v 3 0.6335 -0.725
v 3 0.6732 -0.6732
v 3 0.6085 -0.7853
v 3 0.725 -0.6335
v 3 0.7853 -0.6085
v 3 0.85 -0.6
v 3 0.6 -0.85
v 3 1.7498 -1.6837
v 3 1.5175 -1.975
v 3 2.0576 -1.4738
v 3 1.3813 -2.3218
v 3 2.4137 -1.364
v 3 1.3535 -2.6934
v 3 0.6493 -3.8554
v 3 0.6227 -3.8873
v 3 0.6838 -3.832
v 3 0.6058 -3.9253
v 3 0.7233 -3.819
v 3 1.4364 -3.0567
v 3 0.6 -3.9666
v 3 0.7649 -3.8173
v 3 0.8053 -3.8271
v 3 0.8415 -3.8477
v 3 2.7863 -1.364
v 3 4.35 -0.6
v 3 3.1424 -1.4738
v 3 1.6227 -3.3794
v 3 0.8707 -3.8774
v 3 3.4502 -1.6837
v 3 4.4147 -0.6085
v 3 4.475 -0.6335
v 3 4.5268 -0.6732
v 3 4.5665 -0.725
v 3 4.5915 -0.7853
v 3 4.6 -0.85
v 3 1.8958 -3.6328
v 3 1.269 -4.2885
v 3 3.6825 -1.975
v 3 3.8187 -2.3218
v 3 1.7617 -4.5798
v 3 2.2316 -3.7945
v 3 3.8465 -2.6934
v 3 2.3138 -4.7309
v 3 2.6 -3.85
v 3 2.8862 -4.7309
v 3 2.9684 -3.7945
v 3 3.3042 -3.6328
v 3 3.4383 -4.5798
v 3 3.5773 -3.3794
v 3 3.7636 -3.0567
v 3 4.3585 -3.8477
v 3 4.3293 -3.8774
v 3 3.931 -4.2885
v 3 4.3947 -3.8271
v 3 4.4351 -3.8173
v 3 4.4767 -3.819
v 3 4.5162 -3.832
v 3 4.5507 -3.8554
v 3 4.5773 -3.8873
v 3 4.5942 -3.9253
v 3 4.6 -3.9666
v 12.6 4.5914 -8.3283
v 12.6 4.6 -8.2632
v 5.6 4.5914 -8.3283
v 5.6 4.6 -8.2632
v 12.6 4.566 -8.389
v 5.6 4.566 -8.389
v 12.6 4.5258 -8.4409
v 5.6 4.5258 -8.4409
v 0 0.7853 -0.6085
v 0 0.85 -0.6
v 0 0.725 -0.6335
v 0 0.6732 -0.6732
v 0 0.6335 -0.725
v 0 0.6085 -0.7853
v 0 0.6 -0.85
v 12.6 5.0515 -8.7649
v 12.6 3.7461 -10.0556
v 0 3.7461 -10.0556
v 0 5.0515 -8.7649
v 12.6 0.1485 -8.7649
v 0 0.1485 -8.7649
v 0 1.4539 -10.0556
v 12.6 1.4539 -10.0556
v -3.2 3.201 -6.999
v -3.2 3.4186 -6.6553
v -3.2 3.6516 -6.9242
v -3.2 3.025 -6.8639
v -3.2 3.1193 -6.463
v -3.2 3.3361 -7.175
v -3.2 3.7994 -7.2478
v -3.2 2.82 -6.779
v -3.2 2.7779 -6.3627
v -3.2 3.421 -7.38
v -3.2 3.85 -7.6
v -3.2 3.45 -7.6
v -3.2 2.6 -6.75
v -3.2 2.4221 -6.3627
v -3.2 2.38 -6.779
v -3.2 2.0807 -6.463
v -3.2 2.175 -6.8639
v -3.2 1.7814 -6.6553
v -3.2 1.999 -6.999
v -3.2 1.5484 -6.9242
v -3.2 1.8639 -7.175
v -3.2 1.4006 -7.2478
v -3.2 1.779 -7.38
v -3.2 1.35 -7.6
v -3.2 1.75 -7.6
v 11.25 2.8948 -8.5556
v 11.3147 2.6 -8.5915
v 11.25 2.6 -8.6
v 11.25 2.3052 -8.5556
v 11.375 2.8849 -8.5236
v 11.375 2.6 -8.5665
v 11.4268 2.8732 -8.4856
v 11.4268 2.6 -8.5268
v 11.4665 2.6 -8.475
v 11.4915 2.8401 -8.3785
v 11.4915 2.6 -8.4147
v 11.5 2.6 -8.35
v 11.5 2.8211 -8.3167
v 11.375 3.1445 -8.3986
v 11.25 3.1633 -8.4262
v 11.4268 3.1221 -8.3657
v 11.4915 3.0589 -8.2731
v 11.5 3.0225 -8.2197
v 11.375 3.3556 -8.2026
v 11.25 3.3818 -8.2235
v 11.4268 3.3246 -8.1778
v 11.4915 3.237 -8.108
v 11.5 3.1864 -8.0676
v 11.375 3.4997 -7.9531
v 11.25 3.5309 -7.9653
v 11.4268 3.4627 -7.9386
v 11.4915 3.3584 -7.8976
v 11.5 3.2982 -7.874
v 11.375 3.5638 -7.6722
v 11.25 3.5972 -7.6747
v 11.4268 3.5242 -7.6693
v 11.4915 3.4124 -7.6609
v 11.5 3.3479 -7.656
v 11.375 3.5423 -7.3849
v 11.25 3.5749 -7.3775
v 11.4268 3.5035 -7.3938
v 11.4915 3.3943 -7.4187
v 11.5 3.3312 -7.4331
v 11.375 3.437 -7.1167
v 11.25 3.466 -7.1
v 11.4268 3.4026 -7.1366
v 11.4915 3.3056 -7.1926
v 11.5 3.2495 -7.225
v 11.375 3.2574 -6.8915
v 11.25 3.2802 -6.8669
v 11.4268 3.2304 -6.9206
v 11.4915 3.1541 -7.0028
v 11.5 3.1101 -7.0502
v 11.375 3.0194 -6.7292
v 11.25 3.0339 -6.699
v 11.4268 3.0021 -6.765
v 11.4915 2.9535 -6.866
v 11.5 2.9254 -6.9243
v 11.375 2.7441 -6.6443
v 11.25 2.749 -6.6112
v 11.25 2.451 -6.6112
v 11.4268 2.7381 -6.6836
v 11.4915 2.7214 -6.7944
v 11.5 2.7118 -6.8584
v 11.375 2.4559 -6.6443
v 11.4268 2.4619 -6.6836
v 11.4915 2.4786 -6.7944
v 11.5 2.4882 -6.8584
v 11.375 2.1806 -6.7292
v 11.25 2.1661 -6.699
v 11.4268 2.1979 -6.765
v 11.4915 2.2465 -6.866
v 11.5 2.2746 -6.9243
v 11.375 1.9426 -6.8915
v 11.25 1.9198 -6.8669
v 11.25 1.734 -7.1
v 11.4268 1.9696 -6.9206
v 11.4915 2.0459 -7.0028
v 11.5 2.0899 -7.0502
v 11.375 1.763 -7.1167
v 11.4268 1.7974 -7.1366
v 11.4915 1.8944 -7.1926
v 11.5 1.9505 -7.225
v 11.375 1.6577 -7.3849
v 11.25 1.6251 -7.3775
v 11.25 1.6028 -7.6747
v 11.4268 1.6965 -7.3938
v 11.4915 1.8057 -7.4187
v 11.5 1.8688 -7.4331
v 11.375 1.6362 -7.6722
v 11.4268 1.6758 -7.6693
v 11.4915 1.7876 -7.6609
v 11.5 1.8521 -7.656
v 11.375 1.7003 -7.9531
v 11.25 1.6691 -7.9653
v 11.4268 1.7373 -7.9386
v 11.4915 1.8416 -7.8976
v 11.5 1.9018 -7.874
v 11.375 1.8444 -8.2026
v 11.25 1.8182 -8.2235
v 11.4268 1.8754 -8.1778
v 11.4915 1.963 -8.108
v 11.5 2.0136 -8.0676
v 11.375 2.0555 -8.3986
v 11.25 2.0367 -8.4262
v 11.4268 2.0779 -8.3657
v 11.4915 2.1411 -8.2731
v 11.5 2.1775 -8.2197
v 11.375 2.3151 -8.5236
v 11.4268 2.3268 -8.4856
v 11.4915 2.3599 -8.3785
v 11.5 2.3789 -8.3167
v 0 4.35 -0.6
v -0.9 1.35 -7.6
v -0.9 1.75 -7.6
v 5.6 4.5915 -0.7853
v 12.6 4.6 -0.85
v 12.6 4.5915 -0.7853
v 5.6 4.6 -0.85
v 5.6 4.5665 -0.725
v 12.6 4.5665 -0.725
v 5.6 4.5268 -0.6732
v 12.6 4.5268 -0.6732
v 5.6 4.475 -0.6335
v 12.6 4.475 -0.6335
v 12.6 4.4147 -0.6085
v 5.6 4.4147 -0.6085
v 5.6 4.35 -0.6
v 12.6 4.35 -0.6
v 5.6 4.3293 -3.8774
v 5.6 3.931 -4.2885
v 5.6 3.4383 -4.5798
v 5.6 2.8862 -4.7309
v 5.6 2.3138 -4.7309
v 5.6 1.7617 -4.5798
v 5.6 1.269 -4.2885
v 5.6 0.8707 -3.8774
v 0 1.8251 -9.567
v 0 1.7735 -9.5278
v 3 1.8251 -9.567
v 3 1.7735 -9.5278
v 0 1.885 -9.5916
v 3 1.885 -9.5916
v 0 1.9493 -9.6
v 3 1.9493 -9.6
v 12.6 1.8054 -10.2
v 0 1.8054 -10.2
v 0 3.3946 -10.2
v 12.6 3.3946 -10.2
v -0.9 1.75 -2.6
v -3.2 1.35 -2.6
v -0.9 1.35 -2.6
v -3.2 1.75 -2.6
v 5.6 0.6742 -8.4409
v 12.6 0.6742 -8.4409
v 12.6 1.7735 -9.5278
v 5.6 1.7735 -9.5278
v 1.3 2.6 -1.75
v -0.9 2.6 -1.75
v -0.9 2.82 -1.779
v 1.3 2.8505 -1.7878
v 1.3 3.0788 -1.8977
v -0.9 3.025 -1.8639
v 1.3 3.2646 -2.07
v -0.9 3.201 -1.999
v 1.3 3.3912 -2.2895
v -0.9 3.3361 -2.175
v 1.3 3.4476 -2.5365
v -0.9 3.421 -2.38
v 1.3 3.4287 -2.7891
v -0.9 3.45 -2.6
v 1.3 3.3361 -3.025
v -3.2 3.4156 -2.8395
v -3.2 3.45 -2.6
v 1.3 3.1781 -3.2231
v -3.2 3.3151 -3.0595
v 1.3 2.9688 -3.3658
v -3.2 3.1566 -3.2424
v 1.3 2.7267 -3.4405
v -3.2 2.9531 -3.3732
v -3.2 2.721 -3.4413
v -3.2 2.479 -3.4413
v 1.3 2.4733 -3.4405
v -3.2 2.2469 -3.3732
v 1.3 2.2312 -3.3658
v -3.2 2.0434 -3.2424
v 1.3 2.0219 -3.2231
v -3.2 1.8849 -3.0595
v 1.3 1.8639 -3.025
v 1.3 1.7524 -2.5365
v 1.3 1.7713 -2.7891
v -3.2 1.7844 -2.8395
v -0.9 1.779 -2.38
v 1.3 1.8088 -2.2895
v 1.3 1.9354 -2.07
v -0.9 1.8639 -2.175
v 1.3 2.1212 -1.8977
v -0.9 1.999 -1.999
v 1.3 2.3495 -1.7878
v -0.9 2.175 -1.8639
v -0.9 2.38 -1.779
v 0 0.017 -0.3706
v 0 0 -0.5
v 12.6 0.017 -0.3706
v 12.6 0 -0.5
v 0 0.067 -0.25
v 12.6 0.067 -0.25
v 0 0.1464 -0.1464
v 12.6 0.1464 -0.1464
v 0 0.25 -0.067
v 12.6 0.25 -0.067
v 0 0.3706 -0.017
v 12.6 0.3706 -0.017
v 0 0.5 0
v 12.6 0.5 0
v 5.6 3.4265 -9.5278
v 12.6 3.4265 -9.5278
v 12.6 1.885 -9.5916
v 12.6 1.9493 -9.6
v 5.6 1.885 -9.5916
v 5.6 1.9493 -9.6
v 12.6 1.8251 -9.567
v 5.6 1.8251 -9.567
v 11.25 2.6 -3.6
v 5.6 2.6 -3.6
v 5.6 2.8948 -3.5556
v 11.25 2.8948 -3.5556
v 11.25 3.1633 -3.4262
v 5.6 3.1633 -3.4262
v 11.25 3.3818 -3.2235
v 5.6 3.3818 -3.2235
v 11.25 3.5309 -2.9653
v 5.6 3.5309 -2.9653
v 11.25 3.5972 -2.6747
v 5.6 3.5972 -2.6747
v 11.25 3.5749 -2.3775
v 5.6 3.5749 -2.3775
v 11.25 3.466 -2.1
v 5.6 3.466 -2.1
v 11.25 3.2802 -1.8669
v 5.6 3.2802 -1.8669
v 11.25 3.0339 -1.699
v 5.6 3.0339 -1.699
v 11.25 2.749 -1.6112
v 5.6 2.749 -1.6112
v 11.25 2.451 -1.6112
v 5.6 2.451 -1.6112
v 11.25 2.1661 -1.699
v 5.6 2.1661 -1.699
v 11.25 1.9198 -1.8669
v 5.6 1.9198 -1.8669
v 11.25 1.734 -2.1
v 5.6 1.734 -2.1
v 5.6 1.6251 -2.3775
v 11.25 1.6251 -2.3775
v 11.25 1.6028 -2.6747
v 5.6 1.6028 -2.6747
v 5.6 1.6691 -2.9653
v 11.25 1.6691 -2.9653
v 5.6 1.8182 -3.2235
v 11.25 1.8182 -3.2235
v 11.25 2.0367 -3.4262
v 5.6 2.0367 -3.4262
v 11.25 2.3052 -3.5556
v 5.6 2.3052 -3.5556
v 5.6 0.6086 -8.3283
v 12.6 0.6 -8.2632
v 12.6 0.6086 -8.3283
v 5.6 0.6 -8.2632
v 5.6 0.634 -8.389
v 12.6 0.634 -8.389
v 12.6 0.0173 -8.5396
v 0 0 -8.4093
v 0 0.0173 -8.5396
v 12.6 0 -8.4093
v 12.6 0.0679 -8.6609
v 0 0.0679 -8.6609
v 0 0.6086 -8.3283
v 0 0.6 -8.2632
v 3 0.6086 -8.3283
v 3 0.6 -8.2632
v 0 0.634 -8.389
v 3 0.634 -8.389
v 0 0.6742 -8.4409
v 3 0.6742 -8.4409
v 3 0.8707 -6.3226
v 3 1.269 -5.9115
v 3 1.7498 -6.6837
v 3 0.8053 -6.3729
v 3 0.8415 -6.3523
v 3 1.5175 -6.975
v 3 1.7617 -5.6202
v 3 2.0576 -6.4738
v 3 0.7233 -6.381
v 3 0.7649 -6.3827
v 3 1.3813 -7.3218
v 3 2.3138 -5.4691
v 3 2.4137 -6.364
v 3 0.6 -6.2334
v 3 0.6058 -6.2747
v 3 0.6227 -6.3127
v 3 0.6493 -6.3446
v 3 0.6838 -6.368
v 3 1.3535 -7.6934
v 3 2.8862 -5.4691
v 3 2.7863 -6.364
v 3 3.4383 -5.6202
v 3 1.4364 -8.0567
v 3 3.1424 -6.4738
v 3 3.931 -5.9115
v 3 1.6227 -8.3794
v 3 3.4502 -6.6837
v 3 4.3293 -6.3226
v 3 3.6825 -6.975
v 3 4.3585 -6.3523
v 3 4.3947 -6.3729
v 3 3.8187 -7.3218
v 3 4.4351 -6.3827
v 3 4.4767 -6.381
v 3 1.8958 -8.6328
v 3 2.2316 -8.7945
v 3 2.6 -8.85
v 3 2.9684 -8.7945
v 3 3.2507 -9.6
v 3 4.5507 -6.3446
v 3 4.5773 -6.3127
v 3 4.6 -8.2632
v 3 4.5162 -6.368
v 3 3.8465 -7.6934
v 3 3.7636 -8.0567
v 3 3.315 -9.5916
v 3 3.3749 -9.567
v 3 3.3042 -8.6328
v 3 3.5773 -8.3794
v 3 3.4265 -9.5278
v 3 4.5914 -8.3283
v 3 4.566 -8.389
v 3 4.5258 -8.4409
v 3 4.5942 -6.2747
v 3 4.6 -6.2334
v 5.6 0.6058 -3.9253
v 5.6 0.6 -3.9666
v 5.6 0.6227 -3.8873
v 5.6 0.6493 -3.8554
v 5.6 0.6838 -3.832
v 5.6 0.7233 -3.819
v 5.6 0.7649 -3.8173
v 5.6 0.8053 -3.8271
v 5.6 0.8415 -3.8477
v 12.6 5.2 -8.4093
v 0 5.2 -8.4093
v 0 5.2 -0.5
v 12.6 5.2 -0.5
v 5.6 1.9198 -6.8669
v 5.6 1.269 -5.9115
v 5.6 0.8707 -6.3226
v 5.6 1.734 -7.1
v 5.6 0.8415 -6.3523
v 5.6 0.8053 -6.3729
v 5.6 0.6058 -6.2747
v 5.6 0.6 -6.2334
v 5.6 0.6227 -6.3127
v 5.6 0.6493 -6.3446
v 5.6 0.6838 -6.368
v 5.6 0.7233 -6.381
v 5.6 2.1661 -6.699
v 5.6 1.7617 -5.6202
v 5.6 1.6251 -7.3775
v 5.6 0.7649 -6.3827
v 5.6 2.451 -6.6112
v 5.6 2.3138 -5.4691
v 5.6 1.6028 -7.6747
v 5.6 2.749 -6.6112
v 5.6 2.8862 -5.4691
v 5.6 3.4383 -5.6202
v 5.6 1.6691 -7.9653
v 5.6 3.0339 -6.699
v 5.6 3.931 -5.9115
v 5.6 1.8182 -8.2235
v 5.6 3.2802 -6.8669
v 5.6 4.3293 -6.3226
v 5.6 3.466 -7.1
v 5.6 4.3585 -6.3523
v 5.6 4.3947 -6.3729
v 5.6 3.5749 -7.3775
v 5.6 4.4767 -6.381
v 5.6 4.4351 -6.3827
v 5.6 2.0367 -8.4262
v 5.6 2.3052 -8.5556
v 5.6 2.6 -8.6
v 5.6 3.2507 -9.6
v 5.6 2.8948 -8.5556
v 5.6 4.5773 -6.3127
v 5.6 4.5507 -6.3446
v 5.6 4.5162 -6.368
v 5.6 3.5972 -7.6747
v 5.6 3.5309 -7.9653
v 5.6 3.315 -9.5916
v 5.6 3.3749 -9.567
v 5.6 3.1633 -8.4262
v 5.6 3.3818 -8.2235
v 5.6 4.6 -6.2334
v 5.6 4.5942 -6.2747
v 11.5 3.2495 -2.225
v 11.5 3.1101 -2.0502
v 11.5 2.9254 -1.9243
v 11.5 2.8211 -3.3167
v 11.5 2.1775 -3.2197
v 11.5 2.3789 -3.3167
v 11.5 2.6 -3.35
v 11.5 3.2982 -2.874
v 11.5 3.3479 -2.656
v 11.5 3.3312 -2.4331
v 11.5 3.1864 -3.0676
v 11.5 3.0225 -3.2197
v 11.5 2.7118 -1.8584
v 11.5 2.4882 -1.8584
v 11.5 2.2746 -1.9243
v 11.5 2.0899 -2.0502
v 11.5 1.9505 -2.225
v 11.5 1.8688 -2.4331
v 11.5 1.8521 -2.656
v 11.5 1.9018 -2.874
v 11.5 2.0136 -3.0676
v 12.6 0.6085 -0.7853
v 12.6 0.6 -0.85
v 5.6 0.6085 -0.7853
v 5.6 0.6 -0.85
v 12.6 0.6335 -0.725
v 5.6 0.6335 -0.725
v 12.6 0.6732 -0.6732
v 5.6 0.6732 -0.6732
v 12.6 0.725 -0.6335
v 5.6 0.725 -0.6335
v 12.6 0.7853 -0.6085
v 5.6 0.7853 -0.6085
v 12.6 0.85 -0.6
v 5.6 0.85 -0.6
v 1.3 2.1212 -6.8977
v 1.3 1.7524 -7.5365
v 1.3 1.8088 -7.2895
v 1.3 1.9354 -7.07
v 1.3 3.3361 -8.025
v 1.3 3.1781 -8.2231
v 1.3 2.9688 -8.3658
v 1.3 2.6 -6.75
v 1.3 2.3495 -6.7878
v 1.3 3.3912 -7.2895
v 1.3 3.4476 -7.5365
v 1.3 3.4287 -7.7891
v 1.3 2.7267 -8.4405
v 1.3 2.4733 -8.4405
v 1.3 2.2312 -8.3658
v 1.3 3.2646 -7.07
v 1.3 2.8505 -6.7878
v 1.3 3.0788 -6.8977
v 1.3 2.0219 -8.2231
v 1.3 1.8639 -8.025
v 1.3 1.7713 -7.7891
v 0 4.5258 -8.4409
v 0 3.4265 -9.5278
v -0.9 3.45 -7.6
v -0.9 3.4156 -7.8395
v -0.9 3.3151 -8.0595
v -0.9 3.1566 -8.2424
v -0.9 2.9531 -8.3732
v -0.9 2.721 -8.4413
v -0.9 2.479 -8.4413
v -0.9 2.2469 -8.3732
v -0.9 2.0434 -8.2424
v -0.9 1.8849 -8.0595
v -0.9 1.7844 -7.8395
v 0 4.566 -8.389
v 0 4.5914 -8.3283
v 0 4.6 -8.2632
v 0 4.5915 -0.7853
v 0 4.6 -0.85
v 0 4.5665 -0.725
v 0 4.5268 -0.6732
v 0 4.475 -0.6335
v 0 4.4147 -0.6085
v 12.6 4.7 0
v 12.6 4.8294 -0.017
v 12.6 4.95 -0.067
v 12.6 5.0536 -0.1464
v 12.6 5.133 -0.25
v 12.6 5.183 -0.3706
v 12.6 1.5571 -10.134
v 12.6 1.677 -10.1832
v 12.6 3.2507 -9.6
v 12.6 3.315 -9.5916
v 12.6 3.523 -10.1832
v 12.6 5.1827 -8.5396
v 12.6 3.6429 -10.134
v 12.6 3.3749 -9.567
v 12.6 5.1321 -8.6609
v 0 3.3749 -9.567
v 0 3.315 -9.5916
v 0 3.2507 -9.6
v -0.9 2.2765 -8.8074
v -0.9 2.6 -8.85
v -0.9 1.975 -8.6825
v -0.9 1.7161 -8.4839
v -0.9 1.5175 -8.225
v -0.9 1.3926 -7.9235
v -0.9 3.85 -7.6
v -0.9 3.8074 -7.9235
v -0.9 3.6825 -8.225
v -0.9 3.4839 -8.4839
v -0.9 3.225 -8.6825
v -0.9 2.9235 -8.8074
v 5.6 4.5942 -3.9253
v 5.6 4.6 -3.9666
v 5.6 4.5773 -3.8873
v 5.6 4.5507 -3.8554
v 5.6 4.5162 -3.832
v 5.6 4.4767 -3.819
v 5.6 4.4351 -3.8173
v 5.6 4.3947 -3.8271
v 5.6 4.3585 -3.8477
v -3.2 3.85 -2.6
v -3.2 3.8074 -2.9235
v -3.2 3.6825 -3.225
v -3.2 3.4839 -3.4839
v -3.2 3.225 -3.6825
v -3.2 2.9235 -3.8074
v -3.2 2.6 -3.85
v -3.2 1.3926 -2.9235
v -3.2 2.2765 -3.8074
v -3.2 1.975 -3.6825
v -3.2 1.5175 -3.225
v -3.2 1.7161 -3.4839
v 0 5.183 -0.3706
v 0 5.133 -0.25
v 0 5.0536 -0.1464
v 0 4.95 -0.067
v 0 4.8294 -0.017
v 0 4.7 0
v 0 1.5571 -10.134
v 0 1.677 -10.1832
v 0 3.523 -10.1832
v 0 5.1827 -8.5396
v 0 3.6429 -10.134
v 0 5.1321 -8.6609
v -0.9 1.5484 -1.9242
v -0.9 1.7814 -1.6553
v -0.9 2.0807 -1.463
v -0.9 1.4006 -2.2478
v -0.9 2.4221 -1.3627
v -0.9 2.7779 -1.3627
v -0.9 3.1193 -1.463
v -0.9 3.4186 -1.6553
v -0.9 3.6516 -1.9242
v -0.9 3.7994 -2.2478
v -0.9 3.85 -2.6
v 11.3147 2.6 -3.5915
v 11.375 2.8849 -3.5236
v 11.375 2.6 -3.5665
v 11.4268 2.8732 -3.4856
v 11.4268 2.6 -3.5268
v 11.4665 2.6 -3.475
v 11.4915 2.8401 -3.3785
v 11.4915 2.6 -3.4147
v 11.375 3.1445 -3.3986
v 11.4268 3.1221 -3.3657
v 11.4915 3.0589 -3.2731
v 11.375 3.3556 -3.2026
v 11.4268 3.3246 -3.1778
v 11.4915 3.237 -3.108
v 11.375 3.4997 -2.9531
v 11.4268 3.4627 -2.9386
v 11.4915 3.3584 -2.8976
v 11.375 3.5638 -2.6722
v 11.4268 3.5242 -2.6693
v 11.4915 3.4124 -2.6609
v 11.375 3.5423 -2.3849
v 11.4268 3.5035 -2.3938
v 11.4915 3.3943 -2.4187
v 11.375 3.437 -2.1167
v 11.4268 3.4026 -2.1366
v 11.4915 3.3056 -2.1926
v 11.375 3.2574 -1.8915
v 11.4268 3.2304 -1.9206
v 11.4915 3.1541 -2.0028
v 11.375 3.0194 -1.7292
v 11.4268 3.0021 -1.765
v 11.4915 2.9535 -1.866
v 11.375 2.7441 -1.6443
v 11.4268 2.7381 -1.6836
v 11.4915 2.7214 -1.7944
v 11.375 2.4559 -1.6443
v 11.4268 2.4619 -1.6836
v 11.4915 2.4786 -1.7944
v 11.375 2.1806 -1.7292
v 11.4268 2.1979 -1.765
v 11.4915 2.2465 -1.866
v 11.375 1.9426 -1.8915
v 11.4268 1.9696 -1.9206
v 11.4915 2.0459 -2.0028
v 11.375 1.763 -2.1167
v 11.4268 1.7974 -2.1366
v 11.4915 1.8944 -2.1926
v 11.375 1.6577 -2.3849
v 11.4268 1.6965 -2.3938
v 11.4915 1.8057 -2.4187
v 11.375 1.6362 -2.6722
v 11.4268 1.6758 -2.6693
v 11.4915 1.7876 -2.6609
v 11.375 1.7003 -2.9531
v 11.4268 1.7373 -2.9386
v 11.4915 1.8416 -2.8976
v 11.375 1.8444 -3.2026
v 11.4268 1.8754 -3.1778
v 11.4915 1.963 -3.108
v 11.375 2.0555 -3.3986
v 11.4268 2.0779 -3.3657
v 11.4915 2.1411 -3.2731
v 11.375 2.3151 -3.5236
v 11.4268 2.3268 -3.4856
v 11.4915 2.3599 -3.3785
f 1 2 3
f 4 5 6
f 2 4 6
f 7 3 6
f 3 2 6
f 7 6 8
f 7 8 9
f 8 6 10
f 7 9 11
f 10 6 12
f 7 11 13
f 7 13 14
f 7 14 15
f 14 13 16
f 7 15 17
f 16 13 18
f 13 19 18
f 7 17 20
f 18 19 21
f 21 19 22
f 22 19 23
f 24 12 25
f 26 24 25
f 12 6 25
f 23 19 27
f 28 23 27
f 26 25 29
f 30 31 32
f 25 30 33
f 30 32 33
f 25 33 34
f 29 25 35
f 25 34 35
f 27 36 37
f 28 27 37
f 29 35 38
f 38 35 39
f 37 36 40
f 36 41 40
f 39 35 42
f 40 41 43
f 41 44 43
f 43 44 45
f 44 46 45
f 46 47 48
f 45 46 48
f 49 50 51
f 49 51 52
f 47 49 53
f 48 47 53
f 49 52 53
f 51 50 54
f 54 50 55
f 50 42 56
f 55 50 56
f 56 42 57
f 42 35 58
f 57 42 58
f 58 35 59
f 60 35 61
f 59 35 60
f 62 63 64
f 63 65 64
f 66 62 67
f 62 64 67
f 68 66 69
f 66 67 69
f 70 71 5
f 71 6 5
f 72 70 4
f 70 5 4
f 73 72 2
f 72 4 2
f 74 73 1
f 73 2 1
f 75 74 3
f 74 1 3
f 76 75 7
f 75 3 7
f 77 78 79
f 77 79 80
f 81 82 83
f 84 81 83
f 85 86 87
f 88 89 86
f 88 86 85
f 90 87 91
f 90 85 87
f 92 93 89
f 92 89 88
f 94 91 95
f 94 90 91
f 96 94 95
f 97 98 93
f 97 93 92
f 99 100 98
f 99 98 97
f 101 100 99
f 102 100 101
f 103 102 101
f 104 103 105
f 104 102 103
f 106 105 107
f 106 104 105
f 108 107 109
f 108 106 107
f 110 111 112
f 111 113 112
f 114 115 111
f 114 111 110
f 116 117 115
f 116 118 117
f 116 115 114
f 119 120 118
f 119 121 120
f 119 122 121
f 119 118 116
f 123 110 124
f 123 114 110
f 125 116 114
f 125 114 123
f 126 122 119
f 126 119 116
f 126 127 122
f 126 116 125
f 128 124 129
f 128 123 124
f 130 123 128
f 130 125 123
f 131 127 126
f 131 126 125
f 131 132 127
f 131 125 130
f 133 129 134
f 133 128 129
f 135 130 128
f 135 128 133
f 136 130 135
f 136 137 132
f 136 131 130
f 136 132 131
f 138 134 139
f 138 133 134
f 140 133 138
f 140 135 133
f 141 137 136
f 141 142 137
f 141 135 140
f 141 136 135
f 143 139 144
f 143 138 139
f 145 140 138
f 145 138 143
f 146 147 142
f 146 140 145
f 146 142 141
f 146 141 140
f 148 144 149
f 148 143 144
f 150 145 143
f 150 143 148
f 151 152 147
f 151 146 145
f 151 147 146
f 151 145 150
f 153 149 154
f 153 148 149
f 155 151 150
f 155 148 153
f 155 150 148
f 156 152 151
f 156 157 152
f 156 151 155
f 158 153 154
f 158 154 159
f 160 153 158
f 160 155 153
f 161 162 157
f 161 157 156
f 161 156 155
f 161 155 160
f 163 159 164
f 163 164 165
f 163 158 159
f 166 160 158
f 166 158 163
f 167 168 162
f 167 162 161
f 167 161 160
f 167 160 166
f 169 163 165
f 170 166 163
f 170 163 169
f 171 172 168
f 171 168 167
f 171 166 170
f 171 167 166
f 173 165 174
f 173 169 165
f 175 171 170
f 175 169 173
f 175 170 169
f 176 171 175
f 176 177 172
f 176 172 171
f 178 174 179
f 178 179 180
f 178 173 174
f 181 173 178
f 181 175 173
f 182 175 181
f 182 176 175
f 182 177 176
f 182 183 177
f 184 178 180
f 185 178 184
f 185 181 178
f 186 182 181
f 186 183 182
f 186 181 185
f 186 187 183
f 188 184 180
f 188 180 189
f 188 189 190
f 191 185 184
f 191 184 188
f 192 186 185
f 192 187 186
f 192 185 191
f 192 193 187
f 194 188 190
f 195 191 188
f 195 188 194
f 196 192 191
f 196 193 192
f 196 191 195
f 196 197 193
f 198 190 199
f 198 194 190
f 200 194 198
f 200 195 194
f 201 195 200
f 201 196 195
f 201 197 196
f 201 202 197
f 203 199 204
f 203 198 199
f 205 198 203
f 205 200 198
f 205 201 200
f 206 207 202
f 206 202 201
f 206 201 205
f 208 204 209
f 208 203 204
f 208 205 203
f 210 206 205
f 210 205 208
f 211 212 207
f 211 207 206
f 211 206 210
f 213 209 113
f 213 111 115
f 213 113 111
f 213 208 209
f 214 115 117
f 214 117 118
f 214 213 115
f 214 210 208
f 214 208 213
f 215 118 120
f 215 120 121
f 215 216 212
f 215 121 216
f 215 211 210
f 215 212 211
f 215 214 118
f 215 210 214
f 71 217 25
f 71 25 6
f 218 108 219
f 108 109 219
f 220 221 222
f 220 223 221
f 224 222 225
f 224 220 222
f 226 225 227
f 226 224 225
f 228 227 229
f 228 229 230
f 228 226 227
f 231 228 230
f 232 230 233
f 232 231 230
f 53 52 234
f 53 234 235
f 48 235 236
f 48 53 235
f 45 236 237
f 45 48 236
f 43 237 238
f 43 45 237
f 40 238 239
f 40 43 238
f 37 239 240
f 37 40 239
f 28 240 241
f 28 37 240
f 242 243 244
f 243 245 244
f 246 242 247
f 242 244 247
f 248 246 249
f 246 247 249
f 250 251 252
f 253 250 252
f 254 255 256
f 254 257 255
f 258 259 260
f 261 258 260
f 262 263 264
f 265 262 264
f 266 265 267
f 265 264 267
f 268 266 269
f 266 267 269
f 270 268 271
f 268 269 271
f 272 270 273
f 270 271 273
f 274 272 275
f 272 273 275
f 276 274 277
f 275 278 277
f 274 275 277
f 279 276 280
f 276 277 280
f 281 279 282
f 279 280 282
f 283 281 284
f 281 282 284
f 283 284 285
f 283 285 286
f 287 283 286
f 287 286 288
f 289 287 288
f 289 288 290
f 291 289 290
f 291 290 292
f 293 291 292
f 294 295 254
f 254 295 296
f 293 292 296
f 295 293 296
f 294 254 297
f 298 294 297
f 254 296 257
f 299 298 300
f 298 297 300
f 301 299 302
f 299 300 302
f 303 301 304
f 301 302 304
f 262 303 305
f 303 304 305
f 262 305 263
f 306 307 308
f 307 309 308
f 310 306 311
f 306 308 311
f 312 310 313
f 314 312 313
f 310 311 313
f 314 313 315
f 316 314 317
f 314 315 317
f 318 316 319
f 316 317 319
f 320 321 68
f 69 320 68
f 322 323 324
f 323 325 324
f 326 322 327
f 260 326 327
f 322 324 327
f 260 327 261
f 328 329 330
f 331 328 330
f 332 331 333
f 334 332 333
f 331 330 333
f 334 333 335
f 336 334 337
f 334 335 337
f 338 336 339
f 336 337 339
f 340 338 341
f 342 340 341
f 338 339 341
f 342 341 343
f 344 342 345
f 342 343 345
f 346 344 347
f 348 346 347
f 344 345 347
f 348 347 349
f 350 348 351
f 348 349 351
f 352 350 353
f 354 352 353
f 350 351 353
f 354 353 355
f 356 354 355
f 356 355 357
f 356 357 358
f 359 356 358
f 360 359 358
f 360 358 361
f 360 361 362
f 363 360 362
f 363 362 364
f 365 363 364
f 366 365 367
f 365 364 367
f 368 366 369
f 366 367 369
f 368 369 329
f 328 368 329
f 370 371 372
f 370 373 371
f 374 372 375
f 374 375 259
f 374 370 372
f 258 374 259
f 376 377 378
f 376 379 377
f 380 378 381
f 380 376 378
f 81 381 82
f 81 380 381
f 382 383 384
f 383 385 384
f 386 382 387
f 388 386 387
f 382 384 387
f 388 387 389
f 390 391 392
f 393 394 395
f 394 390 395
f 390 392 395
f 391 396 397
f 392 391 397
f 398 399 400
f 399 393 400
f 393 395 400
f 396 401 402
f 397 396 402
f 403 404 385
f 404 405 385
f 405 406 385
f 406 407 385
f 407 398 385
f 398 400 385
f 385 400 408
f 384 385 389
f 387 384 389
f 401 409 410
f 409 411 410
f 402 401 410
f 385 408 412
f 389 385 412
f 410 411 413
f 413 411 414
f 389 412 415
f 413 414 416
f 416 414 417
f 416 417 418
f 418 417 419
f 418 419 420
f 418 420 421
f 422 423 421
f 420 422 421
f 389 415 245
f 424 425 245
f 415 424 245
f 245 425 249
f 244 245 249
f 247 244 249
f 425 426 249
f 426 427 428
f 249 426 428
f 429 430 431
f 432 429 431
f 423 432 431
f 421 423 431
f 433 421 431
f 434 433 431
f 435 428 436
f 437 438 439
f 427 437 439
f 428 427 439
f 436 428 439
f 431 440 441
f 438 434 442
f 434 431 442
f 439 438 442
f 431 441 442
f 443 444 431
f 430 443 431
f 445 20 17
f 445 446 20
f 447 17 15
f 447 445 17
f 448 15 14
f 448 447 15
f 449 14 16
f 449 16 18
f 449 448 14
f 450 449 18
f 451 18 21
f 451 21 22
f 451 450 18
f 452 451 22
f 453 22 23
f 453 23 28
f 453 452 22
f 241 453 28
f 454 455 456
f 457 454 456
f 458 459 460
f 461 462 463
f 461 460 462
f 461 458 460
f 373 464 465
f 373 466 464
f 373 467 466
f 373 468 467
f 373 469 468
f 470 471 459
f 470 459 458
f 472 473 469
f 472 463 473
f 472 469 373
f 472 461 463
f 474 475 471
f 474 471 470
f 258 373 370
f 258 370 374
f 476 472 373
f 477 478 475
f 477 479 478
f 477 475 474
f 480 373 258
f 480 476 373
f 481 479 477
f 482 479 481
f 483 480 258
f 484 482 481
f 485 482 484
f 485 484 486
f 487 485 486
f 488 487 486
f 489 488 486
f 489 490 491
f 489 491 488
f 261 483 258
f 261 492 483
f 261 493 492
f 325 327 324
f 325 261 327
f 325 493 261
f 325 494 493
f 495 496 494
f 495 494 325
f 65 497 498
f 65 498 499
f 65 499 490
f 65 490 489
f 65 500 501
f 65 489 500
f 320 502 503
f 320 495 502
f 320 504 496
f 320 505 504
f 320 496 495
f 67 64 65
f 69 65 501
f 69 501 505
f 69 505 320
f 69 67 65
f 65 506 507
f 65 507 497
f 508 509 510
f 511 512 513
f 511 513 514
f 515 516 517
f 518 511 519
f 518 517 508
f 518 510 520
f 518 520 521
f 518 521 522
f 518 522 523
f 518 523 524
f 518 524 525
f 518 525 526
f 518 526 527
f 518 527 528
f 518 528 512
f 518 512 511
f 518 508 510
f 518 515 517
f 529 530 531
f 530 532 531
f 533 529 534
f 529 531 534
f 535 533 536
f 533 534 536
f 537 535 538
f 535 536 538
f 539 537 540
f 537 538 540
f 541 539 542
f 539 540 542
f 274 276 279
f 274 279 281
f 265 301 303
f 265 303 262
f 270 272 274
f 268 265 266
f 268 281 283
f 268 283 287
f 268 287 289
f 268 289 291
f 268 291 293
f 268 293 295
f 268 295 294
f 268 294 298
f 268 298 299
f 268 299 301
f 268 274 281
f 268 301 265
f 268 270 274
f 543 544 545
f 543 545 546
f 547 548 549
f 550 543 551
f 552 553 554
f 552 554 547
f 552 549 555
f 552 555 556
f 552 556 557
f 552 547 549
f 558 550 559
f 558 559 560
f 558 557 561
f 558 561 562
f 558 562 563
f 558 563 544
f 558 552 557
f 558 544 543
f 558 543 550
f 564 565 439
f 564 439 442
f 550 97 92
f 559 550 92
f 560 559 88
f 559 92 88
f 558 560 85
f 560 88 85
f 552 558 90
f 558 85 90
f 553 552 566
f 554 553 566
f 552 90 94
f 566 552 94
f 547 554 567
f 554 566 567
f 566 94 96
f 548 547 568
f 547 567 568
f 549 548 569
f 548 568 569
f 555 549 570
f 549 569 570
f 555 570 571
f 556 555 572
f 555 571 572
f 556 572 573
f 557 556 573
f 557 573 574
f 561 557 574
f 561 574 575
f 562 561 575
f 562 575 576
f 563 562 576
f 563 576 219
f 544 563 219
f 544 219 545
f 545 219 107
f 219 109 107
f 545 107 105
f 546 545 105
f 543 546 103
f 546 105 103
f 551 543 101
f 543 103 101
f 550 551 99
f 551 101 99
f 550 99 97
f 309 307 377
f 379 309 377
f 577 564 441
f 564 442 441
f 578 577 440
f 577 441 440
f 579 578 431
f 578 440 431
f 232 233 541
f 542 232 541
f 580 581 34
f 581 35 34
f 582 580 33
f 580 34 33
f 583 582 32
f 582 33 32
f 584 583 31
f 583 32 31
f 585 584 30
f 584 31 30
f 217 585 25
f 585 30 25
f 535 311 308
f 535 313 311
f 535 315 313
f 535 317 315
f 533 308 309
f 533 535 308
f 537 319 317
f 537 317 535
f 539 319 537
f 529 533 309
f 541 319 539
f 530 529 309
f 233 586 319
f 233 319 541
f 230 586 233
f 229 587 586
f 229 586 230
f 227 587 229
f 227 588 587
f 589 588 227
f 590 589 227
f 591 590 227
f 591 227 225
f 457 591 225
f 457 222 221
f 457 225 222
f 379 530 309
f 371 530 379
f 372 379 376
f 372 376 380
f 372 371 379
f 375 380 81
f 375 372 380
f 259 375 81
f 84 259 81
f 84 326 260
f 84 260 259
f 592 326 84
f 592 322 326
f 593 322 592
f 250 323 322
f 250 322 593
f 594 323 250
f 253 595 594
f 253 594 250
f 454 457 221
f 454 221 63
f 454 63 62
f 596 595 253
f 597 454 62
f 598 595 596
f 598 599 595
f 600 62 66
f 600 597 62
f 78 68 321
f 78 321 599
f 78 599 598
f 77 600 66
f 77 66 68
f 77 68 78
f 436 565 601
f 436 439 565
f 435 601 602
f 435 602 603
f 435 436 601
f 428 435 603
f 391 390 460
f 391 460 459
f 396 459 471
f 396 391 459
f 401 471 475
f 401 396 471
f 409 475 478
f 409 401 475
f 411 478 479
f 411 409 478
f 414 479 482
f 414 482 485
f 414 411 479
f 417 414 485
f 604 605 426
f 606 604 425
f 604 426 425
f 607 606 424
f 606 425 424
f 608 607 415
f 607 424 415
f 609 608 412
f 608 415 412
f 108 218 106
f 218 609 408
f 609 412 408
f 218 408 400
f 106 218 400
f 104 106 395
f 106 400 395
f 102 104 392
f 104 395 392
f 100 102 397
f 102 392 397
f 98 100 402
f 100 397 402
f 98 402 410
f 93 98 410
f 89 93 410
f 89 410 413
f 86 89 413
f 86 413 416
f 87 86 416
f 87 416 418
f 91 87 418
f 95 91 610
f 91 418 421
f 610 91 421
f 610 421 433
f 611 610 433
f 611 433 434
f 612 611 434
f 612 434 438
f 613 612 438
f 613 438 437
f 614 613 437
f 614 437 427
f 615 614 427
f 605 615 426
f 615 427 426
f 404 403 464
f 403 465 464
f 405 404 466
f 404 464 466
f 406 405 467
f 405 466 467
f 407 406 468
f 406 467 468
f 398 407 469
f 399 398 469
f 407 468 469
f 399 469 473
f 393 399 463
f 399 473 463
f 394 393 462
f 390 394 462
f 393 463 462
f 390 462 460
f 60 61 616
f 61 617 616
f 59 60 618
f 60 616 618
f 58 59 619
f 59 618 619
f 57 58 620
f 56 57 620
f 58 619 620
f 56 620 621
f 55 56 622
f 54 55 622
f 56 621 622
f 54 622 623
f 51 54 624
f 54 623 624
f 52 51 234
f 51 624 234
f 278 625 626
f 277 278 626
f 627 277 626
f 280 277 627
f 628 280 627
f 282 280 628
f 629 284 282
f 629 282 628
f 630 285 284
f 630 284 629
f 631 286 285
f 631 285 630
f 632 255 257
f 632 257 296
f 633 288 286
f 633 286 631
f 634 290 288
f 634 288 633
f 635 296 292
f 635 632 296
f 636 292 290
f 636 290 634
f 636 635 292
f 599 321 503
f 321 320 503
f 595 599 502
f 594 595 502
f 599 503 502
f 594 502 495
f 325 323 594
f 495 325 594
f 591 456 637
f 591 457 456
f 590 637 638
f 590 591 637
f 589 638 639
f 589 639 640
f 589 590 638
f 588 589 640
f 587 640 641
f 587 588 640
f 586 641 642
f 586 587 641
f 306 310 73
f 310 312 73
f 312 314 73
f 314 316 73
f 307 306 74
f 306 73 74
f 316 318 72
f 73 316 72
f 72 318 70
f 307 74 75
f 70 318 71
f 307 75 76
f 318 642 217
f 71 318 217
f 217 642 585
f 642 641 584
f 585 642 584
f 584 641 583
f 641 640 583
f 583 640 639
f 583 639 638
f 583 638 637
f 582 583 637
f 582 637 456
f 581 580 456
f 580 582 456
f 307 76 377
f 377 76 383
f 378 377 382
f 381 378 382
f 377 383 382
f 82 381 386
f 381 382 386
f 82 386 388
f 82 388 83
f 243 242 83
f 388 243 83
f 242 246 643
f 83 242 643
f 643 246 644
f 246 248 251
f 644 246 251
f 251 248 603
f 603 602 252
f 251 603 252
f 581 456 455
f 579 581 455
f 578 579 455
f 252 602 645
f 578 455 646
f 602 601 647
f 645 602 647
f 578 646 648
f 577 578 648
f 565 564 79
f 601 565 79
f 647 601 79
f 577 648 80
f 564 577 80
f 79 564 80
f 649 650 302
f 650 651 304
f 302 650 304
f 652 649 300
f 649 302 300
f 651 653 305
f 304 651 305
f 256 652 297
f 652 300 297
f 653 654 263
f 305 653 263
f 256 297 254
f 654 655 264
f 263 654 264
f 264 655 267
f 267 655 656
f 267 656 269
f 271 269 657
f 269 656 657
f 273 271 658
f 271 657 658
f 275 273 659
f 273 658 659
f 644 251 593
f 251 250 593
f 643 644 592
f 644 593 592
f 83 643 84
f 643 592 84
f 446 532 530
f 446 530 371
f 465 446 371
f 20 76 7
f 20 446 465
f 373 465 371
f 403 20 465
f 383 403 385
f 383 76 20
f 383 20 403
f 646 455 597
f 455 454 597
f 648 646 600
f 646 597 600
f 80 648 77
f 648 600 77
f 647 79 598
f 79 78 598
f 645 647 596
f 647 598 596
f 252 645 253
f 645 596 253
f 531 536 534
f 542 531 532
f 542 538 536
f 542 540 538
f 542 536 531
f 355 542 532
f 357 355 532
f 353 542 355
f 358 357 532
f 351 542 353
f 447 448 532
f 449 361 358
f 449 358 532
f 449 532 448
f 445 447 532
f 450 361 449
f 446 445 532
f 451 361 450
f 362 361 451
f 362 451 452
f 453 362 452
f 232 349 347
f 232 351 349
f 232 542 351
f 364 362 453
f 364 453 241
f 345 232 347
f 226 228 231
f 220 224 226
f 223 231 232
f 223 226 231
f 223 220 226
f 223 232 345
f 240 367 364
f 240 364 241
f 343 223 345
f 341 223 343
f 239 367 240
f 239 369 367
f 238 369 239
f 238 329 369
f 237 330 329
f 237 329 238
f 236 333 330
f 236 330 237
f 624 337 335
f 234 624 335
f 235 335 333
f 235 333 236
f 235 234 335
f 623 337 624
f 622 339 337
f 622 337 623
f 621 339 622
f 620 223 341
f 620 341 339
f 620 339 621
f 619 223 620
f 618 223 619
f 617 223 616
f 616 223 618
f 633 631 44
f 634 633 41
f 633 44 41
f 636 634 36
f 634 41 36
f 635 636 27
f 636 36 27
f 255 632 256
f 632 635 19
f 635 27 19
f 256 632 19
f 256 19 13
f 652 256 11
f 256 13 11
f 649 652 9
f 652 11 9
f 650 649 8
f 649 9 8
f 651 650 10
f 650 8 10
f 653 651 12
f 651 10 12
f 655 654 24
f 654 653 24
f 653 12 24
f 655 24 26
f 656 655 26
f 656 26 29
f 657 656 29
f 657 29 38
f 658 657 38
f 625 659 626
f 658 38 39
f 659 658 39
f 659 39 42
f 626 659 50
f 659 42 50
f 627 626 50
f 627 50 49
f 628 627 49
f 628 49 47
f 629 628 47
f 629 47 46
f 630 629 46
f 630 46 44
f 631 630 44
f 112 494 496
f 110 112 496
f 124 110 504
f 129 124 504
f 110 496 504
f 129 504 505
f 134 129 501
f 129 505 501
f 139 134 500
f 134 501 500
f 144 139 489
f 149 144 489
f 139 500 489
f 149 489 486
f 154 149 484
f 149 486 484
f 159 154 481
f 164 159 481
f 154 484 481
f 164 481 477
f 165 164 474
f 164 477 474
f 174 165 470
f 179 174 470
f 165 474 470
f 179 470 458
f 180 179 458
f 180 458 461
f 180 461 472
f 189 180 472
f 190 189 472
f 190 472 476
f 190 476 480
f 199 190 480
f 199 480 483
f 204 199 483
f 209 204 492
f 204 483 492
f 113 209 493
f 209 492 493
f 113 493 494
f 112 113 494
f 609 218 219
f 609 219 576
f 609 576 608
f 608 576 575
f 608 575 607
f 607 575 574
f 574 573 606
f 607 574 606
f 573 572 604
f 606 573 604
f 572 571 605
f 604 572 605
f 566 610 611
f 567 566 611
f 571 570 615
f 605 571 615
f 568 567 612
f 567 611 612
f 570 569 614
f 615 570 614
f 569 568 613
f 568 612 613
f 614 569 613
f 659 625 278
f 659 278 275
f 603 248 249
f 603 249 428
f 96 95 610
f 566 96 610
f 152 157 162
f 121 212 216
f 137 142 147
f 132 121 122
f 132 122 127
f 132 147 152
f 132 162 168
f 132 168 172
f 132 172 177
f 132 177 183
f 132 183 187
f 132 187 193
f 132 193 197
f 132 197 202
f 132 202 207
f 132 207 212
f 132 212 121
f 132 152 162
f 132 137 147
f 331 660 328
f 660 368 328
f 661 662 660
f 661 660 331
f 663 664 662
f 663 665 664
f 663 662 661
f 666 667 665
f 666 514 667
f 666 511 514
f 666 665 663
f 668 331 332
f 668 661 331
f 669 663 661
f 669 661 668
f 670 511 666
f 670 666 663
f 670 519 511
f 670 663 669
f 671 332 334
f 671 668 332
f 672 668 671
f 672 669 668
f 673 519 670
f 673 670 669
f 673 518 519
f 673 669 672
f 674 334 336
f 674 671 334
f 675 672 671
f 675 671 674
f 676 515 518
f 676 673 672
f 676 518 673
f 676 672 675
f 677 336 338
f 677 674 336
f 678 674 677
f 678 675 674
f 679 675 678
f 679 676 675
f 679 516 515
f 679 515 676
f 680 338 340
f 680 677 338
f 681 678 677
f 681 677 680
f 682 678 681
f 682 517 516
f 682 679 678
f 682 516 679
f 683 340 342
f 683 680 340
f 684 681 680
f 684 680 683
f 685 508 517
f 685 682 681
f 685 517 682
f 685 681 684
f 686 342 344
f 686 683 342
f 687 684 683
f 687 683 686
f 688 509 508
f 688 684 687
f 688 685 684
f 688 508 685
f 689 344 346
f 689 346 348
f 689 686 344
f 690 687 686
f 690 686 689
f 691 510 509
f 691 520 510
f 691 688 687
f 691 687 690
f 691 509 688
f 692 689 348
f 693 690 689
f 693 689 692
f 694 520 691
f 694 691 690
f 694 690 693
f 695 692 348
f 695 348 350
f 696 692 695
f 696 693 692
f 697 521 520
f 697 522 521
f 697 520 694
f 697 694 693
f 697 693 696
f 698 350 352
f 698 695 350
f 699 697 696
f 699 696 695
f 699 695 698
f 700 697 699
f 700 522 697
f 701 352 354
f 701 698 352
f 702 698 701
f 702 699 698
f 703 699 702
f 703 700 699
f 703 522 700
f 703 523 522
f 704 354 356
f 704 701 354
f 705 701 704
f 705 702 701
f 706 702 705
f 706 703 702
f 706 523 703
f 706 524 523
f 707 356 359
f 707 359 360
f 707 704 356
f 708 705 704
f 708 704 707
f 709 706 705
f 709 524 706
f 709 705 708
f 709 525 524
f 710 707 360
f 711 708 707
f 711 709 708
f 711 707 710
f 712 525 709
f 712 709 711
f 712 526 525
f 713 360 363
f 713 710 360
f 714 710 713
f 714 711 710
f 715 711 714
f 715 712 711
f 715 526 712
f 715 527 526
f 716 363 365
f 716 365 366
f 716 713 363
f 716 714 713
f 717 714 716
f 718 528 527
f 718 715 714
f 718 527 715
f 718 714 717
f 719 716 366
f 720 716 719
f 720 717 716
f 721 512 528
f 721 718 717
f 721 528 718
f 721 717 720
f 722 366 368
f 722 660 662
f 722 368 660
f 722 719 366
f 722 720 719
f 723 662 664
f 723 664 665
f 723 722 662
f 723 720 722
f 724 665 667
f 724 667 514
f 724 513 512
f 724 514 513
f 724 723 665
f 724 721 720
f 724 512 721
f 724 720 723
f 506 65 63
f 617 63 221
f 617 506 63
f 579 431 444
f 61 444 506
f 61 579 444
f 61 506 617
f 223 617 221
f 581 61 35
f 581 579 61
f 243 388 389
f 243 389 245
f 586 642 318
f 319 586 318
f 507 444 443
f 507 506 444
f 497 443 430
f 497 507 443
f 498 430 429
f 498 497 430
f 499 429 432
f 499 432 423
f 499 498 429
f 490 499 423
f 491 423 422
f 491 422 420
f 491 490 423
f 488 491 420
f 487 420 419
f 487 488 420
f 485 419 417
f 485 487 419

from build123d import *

# Parameters (mm, degrees)
BOSS_EXTRUDE1_DEPTH = 12.6
CUT_EXTRUDE1_DEPTH  = 7
CUT_EXTRUDE2_DEPTH  = 3
SKETCH5_R           = 1
BOSS_EXTRUDE2_DEPTH = 5.9
SKETCH6_R           = 1.25
BOSS_EXTRUDE3_DEPTH = 6.2
SKETCH7_R           = 0.85
CUT_EXTRUDE3_DEPTH  = 4.5
SKETCH8_W           = 3.3
SKETCH8_H           = 2.25
CUT_EXTRUDE4_DEPTH  = 18.024687956
CUT_EXTRUDE5_DEPTH  = 15.941218156
FILLET1_R           = 0.5
FILLET2_R           = 0.25
FILLET3_R           = 0.15
FILLET4_R           = 0.25


with BuildPart() as part:
    # Sketch1 → Boss-Extrude1 (new body)
    with BuildSketch(Plane(origin=(0, 0, 0), x_dir=(0, 0, -1), z_dir=(1, 0, 0))):
        Polygon((0, 0), (8.618070798, 0), (10.2, 1.6), (10.2, 3.6), (8.618070798, 5.2), (0, 5.2), align=None)
    extrude(amount=BOSS_EXTRUDE1_DEPTH)

    # Sketch2 → Cut-Extrude1 (cut)
    with BuildSketch(Plane(origin=(12.6, 0, 0), x_dir=(0, 0, -1), z_dir=(1, 0, 0))):
        Polygon((9.6, 3.353465579), (8.367544249, 4.6), (0.6, 4.6), (0.6, 0.6), (8.367544249, 0.6), (9.6, 1.846534421), align=None)
    extrude(amount=-CUT_EXTRUDE1_DEPTH, mode=Mode.SUBTRACT)

    # Sketch3 → Cut-Extrude2 (cut)
    with BuildSketch(Plane(origin=(0, 0, 0), x_dir=(0, 0, -1), z_dir=(1, 0, 0))):
        Polygon((9.6, 3.353465579), (8.367544249, 4.6), (0.6, 4.6), (0.6, 0.6), (8.367544249, 0.6), (9.6, 1.846534421), align=None)
    extrude(amount=CUT_EXTRUDE2_DEPTH, mode=Mode.SUBTRACT)

    # Sketch5 → Boss-Extrude2 (add)
    with BuildSketch(Plane(origin=(5.6, 0, 0), x_dir=(0, 0, -1), z_dir=(1, 0, 0))):
        with Locations((2.6, 2.6)):
            Circle(SKETCH5_R)
        with Locations((7.6, 2.6)):
            Circle(SKETCH5_R)
    extrude(amount=BOSS_EXTRUDE2_DEPTH)

    # Sketch6 → Boss-Extrude3 (add)
    with BuildSketch(Plane.ZY.offset(-3)):
        with Locations(Location((-7.6, 2.6, 0), (0, 0, 180))):
            Circle(SKETCH6_R)
        with Locations(Location((-2.6, 2.6, 0), (0, 0, 180))):
            Circle(SKETCH6_R)
    extrude(amount=BOSS_EXTRUDE3_DEPTH)

    # Sketch7 → Cut-Extrude3 (cut)
    with BuildSketch(Plane.ZY.offset(3.2)):
        with Locations((-7.6, 2.6)):
            Circle(SKETCH7_R)
        with Locations((-2.6, 2.6)):
            Circle(SKETCH7_R)
    extrude(amount=-CUT_EXTRUDE3_DEPTH, mode=Mode.SUBTRACT)

    # Sketch8 → Cut-Extrude4 (cut, through all)
    with BuildSketch(Plane(origin=(0, 5.2, 0), x_dir=(1, 0, 0), z_dir=(0, 1, 0))):
        with Locations((-2.55, 8.725)):
            Rectangle(SKETCH8_W, SKETCH8_H)
        with Locations((-2.55, 1.475)):
            Rectangle(SKETCH8_W, SKETCH8_H)
    extrude(amount=-CUT_EXTRUDE4_DEPTH, mode=Mode.SUBTRACT)

    # Sketch9 → Cut-Extrude5 (cut, through all)
    with BuildSketch(Plane.ZY.offset(-3)):
        with BuildLine():
            Line((-6.811013308, 4.6), (-3.388986692, 4.6))
            ThreePointArc((-3.388986692, 4.6), (-4.75, 2.6), (-3.388986692, 0.6))
            Line((-3.388986692, 0.6), (-6.811013308, 0.6))
            ThreePointArc((-6.811013308, 0.6), (-5.45, 2.6), (-6.811013308, 4.6))
        make_face()
    extrude(amount=-CUT_EXTRUDE5_DEPTH, mode=Mode.SUBTRACT)

    # Fillet1
    fillet1_edges = [part.edges().sort_by_distance(p)[0] for p in [
        (6.3, 5.2, 0),
        (6.3, 5.2, -8.618070798),
        (6.3, 3.6, -10.2),
        (6.3, 1.6, -10.2),
        (6.3, 0, -8.618070798),
        (6.3, 0, 0),
    ]]
    fillet(fillet1_edges, radius=FILLET1_R)

    # Fillet2
    fillet2_edges = [part.edges().sort_by_distance(p)[0] for p in [
        (9.1, 3.353465579, -9.6),
        (9.1, 1.846534421, -9.6),
        (9.1, 0.6, -8.367544249),
        (9.1, 0.6, -0.6),
        (9.1, 4.6, -0.6),
        (9.1, 4.6, -8.367544249),
        (1.5, 1.846534421, -9.6),
        (1.5, 3.353465579, -9.6),
        (1.5, 4.6, -8.367544249),
        (1.5, 4.6, -0.6),
        (1.5, 0.6, -0.6),
        (1.5, 0.6, -8.367544249),
    ]]
    fillet(fillet2_edges, radius=FILLET2_R)

    # Fillet3
    fillet3_edges = [part.edges().sort_by_distance(p)[0] for p in [
        (4.3, 0.6, -6.811013308),
        (4.3, 4.6, -6.811013308),
        (4.3, 4.6, -3.388986692),
        (4.3, 0.6, -3.388986692),
    ]]
    fillet(fillet3_edges, radius=FILLET3_R)

    # Fillet4
    fillet4_edges = [part.edges().sort_by_distance(p)[0] for p in [
        (11.5, 2.6, -1.6),
        (11.5, 2.6, -6.6),
    ]]
    fillet(fillet4_edges, radius=FILLET4_R)


solid = part.part
